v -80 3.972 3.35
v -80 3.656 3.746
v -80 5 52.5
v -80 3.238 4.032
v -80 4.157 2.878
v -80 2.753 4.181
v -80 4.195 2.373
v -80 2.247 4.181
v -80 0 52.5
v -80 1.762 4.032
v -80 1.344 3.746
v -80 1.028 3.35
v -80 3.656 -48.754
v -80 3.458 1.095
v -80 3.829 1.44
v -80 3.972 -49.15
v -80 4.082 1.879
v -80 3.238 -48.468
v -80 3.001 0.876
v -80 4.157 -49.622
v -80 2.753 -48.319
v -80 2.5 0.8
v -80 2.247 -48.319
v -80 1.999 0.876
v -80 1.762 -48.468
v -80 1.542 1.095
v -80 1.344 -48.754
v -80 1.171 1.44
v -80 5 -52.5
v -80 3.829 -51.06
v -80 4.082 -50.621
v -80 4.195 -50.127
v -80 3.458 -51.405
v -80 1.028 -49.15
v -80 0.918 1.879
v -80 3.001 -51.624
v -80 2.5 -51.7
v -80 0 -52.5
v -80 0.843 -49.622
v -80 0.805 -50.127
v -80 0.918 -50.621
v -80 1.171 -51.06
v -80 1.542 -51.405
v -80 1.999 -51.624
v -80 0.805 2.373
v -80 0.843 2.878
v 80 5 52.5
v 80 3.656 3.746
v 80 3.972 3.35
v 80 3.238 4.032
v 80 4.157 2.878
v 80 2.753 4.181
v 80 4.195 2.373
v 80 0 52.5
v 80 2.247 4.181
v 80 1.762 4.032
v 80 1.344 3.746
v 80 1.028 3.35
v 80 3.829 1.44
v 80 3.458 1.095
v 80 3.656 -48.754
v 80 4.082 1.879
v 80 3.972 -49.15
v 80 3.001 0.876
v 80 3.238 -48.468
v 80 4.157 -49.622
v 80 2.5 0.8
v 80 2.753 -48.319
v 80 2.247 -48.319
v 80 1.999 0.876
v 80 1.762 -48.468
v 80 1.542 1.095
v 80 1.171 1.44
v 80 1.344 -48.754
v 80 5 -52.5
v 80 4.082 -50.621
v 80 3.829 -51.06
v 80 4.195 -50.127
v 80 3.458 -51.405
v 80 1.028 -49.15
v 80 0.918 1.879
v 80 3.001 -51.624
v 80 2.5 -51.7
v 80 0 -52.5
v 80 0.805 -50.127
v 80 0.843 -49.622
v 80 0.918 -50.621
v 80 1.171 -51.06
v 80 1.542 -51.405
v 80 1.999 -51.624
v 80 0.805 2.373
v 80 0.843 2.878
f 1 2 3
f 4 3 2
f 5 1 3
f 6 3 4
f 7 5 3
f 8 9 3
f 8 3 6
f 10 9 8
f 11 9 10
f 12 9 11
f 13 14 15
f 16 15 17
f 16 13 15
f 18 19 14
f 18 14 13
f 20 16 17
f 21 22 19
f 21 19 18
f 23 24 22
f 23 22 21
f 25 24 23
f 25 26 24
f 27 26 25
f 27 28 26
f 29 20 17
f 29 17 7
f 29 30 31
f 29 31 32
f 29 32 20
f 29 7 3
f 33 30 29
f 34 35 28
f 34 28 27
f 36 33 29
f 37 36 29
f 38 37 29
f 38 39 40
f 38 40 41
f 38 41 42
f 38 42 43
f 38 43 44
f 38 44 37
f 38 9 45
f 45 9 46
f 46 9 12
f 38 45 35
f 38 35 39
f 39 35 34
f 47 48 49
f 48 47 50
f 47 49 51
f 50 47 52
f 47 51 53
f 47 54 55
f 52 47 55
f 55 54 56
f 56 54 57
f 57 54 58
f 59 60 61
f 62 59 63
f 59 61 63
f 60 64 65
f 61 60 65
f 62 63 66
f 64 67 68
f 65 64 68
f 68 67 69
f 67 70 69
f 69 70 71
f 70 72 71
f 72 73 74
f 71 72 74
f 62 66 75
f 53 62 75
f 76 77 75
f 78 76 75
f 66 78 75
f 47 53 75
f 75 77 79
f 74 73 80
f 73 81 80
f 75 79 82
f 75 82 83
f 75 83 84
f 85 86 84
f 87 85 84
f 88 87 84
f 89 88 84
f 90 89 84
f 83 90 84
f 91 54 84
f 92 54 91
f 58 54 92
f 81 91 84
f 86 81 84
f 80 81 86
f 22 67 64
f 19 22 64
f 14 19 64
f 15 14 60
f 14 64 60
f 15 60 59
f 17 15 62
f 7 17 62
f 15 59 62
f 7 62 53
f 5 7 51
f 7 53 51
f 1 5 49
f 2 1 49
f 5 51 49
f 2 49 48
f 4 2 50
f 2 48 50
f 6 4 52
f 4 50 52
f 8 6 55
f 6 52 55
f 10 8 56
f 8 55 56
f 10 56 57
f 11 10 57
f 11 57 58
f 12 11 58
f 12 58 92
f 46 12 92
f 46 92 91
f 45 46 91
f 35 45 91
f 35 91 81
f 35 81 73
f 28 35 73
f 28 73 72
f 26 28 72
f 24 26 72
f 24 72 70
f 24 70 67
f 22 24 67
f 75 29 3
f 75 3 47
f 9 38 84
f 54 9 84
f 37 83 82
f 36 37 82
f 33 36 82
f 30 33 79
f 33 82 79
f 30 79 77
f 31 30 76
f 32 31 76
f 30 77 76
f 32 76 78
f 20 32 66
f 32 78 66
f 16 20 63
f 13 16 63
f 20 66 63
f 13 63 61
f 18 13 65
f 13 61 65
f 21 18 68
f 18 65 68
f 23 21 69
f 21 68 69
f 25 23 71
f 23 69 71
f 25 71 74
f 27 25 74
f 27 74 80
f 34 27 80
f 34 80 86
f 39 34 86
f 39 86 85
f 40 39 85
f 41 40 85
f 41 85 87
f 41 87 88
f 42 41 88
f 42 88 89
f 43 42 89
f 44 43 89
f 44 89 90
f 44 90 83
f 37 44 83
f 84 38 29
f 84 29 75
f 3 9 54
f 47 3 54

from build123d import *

# Parameters (mm, degrees)
SKETCH_1_W          = 160
SKETCH_1_H          = 105
EXTRUDE_1_DEPTH     = 5
SKETCH_2_R          = 1.7
CUT_EXTRUDE_1_DEPTH = 200
SKETCH_3_R          = 1.7
CUT_EXTRUDE_2_DEPTH = 200


with BuildPart() as part:
    # 草图1 → 凸台-拉伸1 (new body)
    with BuildSketch(Plane(origin=(0, 0, 0), x_dir=(1, 0, 0), z_dir=(0, 1, 0))):
        Rectangle(SKETCH_1_W, SKETCH_1_H)
    extrude(amount=EXTRUDE_1_DEPTH)

    # 草图2 → 切除-拉伸1 (cut)
    with BuildSketch(Plane(origin=(80, 0, 0), x_dir=(0, 0, -1), z_dir=(1, 0, 0))):
        with Locations((-2.5, 2.5)):
            Circle(SKETCH_2_R)
    extrude(amount=-CUT_EXTRUDE_1_DEPTH, mode=Mode.SUBTRACT)

    # 草图3 → 切除-拉伸2 (cut)
    with BuildSketch(Plane(origin=(80, 0, 0), x_dir=(0, 0, -1), z_dir=(1, 0, 0))):
        with Locations((50, 2.5)):
            Circle(SKETCH_3_R)
    extrude(amount=-CUT_EXTRUDE_2_DEPTH, mode=Mode.SUBTRACT)


solid = part.part
